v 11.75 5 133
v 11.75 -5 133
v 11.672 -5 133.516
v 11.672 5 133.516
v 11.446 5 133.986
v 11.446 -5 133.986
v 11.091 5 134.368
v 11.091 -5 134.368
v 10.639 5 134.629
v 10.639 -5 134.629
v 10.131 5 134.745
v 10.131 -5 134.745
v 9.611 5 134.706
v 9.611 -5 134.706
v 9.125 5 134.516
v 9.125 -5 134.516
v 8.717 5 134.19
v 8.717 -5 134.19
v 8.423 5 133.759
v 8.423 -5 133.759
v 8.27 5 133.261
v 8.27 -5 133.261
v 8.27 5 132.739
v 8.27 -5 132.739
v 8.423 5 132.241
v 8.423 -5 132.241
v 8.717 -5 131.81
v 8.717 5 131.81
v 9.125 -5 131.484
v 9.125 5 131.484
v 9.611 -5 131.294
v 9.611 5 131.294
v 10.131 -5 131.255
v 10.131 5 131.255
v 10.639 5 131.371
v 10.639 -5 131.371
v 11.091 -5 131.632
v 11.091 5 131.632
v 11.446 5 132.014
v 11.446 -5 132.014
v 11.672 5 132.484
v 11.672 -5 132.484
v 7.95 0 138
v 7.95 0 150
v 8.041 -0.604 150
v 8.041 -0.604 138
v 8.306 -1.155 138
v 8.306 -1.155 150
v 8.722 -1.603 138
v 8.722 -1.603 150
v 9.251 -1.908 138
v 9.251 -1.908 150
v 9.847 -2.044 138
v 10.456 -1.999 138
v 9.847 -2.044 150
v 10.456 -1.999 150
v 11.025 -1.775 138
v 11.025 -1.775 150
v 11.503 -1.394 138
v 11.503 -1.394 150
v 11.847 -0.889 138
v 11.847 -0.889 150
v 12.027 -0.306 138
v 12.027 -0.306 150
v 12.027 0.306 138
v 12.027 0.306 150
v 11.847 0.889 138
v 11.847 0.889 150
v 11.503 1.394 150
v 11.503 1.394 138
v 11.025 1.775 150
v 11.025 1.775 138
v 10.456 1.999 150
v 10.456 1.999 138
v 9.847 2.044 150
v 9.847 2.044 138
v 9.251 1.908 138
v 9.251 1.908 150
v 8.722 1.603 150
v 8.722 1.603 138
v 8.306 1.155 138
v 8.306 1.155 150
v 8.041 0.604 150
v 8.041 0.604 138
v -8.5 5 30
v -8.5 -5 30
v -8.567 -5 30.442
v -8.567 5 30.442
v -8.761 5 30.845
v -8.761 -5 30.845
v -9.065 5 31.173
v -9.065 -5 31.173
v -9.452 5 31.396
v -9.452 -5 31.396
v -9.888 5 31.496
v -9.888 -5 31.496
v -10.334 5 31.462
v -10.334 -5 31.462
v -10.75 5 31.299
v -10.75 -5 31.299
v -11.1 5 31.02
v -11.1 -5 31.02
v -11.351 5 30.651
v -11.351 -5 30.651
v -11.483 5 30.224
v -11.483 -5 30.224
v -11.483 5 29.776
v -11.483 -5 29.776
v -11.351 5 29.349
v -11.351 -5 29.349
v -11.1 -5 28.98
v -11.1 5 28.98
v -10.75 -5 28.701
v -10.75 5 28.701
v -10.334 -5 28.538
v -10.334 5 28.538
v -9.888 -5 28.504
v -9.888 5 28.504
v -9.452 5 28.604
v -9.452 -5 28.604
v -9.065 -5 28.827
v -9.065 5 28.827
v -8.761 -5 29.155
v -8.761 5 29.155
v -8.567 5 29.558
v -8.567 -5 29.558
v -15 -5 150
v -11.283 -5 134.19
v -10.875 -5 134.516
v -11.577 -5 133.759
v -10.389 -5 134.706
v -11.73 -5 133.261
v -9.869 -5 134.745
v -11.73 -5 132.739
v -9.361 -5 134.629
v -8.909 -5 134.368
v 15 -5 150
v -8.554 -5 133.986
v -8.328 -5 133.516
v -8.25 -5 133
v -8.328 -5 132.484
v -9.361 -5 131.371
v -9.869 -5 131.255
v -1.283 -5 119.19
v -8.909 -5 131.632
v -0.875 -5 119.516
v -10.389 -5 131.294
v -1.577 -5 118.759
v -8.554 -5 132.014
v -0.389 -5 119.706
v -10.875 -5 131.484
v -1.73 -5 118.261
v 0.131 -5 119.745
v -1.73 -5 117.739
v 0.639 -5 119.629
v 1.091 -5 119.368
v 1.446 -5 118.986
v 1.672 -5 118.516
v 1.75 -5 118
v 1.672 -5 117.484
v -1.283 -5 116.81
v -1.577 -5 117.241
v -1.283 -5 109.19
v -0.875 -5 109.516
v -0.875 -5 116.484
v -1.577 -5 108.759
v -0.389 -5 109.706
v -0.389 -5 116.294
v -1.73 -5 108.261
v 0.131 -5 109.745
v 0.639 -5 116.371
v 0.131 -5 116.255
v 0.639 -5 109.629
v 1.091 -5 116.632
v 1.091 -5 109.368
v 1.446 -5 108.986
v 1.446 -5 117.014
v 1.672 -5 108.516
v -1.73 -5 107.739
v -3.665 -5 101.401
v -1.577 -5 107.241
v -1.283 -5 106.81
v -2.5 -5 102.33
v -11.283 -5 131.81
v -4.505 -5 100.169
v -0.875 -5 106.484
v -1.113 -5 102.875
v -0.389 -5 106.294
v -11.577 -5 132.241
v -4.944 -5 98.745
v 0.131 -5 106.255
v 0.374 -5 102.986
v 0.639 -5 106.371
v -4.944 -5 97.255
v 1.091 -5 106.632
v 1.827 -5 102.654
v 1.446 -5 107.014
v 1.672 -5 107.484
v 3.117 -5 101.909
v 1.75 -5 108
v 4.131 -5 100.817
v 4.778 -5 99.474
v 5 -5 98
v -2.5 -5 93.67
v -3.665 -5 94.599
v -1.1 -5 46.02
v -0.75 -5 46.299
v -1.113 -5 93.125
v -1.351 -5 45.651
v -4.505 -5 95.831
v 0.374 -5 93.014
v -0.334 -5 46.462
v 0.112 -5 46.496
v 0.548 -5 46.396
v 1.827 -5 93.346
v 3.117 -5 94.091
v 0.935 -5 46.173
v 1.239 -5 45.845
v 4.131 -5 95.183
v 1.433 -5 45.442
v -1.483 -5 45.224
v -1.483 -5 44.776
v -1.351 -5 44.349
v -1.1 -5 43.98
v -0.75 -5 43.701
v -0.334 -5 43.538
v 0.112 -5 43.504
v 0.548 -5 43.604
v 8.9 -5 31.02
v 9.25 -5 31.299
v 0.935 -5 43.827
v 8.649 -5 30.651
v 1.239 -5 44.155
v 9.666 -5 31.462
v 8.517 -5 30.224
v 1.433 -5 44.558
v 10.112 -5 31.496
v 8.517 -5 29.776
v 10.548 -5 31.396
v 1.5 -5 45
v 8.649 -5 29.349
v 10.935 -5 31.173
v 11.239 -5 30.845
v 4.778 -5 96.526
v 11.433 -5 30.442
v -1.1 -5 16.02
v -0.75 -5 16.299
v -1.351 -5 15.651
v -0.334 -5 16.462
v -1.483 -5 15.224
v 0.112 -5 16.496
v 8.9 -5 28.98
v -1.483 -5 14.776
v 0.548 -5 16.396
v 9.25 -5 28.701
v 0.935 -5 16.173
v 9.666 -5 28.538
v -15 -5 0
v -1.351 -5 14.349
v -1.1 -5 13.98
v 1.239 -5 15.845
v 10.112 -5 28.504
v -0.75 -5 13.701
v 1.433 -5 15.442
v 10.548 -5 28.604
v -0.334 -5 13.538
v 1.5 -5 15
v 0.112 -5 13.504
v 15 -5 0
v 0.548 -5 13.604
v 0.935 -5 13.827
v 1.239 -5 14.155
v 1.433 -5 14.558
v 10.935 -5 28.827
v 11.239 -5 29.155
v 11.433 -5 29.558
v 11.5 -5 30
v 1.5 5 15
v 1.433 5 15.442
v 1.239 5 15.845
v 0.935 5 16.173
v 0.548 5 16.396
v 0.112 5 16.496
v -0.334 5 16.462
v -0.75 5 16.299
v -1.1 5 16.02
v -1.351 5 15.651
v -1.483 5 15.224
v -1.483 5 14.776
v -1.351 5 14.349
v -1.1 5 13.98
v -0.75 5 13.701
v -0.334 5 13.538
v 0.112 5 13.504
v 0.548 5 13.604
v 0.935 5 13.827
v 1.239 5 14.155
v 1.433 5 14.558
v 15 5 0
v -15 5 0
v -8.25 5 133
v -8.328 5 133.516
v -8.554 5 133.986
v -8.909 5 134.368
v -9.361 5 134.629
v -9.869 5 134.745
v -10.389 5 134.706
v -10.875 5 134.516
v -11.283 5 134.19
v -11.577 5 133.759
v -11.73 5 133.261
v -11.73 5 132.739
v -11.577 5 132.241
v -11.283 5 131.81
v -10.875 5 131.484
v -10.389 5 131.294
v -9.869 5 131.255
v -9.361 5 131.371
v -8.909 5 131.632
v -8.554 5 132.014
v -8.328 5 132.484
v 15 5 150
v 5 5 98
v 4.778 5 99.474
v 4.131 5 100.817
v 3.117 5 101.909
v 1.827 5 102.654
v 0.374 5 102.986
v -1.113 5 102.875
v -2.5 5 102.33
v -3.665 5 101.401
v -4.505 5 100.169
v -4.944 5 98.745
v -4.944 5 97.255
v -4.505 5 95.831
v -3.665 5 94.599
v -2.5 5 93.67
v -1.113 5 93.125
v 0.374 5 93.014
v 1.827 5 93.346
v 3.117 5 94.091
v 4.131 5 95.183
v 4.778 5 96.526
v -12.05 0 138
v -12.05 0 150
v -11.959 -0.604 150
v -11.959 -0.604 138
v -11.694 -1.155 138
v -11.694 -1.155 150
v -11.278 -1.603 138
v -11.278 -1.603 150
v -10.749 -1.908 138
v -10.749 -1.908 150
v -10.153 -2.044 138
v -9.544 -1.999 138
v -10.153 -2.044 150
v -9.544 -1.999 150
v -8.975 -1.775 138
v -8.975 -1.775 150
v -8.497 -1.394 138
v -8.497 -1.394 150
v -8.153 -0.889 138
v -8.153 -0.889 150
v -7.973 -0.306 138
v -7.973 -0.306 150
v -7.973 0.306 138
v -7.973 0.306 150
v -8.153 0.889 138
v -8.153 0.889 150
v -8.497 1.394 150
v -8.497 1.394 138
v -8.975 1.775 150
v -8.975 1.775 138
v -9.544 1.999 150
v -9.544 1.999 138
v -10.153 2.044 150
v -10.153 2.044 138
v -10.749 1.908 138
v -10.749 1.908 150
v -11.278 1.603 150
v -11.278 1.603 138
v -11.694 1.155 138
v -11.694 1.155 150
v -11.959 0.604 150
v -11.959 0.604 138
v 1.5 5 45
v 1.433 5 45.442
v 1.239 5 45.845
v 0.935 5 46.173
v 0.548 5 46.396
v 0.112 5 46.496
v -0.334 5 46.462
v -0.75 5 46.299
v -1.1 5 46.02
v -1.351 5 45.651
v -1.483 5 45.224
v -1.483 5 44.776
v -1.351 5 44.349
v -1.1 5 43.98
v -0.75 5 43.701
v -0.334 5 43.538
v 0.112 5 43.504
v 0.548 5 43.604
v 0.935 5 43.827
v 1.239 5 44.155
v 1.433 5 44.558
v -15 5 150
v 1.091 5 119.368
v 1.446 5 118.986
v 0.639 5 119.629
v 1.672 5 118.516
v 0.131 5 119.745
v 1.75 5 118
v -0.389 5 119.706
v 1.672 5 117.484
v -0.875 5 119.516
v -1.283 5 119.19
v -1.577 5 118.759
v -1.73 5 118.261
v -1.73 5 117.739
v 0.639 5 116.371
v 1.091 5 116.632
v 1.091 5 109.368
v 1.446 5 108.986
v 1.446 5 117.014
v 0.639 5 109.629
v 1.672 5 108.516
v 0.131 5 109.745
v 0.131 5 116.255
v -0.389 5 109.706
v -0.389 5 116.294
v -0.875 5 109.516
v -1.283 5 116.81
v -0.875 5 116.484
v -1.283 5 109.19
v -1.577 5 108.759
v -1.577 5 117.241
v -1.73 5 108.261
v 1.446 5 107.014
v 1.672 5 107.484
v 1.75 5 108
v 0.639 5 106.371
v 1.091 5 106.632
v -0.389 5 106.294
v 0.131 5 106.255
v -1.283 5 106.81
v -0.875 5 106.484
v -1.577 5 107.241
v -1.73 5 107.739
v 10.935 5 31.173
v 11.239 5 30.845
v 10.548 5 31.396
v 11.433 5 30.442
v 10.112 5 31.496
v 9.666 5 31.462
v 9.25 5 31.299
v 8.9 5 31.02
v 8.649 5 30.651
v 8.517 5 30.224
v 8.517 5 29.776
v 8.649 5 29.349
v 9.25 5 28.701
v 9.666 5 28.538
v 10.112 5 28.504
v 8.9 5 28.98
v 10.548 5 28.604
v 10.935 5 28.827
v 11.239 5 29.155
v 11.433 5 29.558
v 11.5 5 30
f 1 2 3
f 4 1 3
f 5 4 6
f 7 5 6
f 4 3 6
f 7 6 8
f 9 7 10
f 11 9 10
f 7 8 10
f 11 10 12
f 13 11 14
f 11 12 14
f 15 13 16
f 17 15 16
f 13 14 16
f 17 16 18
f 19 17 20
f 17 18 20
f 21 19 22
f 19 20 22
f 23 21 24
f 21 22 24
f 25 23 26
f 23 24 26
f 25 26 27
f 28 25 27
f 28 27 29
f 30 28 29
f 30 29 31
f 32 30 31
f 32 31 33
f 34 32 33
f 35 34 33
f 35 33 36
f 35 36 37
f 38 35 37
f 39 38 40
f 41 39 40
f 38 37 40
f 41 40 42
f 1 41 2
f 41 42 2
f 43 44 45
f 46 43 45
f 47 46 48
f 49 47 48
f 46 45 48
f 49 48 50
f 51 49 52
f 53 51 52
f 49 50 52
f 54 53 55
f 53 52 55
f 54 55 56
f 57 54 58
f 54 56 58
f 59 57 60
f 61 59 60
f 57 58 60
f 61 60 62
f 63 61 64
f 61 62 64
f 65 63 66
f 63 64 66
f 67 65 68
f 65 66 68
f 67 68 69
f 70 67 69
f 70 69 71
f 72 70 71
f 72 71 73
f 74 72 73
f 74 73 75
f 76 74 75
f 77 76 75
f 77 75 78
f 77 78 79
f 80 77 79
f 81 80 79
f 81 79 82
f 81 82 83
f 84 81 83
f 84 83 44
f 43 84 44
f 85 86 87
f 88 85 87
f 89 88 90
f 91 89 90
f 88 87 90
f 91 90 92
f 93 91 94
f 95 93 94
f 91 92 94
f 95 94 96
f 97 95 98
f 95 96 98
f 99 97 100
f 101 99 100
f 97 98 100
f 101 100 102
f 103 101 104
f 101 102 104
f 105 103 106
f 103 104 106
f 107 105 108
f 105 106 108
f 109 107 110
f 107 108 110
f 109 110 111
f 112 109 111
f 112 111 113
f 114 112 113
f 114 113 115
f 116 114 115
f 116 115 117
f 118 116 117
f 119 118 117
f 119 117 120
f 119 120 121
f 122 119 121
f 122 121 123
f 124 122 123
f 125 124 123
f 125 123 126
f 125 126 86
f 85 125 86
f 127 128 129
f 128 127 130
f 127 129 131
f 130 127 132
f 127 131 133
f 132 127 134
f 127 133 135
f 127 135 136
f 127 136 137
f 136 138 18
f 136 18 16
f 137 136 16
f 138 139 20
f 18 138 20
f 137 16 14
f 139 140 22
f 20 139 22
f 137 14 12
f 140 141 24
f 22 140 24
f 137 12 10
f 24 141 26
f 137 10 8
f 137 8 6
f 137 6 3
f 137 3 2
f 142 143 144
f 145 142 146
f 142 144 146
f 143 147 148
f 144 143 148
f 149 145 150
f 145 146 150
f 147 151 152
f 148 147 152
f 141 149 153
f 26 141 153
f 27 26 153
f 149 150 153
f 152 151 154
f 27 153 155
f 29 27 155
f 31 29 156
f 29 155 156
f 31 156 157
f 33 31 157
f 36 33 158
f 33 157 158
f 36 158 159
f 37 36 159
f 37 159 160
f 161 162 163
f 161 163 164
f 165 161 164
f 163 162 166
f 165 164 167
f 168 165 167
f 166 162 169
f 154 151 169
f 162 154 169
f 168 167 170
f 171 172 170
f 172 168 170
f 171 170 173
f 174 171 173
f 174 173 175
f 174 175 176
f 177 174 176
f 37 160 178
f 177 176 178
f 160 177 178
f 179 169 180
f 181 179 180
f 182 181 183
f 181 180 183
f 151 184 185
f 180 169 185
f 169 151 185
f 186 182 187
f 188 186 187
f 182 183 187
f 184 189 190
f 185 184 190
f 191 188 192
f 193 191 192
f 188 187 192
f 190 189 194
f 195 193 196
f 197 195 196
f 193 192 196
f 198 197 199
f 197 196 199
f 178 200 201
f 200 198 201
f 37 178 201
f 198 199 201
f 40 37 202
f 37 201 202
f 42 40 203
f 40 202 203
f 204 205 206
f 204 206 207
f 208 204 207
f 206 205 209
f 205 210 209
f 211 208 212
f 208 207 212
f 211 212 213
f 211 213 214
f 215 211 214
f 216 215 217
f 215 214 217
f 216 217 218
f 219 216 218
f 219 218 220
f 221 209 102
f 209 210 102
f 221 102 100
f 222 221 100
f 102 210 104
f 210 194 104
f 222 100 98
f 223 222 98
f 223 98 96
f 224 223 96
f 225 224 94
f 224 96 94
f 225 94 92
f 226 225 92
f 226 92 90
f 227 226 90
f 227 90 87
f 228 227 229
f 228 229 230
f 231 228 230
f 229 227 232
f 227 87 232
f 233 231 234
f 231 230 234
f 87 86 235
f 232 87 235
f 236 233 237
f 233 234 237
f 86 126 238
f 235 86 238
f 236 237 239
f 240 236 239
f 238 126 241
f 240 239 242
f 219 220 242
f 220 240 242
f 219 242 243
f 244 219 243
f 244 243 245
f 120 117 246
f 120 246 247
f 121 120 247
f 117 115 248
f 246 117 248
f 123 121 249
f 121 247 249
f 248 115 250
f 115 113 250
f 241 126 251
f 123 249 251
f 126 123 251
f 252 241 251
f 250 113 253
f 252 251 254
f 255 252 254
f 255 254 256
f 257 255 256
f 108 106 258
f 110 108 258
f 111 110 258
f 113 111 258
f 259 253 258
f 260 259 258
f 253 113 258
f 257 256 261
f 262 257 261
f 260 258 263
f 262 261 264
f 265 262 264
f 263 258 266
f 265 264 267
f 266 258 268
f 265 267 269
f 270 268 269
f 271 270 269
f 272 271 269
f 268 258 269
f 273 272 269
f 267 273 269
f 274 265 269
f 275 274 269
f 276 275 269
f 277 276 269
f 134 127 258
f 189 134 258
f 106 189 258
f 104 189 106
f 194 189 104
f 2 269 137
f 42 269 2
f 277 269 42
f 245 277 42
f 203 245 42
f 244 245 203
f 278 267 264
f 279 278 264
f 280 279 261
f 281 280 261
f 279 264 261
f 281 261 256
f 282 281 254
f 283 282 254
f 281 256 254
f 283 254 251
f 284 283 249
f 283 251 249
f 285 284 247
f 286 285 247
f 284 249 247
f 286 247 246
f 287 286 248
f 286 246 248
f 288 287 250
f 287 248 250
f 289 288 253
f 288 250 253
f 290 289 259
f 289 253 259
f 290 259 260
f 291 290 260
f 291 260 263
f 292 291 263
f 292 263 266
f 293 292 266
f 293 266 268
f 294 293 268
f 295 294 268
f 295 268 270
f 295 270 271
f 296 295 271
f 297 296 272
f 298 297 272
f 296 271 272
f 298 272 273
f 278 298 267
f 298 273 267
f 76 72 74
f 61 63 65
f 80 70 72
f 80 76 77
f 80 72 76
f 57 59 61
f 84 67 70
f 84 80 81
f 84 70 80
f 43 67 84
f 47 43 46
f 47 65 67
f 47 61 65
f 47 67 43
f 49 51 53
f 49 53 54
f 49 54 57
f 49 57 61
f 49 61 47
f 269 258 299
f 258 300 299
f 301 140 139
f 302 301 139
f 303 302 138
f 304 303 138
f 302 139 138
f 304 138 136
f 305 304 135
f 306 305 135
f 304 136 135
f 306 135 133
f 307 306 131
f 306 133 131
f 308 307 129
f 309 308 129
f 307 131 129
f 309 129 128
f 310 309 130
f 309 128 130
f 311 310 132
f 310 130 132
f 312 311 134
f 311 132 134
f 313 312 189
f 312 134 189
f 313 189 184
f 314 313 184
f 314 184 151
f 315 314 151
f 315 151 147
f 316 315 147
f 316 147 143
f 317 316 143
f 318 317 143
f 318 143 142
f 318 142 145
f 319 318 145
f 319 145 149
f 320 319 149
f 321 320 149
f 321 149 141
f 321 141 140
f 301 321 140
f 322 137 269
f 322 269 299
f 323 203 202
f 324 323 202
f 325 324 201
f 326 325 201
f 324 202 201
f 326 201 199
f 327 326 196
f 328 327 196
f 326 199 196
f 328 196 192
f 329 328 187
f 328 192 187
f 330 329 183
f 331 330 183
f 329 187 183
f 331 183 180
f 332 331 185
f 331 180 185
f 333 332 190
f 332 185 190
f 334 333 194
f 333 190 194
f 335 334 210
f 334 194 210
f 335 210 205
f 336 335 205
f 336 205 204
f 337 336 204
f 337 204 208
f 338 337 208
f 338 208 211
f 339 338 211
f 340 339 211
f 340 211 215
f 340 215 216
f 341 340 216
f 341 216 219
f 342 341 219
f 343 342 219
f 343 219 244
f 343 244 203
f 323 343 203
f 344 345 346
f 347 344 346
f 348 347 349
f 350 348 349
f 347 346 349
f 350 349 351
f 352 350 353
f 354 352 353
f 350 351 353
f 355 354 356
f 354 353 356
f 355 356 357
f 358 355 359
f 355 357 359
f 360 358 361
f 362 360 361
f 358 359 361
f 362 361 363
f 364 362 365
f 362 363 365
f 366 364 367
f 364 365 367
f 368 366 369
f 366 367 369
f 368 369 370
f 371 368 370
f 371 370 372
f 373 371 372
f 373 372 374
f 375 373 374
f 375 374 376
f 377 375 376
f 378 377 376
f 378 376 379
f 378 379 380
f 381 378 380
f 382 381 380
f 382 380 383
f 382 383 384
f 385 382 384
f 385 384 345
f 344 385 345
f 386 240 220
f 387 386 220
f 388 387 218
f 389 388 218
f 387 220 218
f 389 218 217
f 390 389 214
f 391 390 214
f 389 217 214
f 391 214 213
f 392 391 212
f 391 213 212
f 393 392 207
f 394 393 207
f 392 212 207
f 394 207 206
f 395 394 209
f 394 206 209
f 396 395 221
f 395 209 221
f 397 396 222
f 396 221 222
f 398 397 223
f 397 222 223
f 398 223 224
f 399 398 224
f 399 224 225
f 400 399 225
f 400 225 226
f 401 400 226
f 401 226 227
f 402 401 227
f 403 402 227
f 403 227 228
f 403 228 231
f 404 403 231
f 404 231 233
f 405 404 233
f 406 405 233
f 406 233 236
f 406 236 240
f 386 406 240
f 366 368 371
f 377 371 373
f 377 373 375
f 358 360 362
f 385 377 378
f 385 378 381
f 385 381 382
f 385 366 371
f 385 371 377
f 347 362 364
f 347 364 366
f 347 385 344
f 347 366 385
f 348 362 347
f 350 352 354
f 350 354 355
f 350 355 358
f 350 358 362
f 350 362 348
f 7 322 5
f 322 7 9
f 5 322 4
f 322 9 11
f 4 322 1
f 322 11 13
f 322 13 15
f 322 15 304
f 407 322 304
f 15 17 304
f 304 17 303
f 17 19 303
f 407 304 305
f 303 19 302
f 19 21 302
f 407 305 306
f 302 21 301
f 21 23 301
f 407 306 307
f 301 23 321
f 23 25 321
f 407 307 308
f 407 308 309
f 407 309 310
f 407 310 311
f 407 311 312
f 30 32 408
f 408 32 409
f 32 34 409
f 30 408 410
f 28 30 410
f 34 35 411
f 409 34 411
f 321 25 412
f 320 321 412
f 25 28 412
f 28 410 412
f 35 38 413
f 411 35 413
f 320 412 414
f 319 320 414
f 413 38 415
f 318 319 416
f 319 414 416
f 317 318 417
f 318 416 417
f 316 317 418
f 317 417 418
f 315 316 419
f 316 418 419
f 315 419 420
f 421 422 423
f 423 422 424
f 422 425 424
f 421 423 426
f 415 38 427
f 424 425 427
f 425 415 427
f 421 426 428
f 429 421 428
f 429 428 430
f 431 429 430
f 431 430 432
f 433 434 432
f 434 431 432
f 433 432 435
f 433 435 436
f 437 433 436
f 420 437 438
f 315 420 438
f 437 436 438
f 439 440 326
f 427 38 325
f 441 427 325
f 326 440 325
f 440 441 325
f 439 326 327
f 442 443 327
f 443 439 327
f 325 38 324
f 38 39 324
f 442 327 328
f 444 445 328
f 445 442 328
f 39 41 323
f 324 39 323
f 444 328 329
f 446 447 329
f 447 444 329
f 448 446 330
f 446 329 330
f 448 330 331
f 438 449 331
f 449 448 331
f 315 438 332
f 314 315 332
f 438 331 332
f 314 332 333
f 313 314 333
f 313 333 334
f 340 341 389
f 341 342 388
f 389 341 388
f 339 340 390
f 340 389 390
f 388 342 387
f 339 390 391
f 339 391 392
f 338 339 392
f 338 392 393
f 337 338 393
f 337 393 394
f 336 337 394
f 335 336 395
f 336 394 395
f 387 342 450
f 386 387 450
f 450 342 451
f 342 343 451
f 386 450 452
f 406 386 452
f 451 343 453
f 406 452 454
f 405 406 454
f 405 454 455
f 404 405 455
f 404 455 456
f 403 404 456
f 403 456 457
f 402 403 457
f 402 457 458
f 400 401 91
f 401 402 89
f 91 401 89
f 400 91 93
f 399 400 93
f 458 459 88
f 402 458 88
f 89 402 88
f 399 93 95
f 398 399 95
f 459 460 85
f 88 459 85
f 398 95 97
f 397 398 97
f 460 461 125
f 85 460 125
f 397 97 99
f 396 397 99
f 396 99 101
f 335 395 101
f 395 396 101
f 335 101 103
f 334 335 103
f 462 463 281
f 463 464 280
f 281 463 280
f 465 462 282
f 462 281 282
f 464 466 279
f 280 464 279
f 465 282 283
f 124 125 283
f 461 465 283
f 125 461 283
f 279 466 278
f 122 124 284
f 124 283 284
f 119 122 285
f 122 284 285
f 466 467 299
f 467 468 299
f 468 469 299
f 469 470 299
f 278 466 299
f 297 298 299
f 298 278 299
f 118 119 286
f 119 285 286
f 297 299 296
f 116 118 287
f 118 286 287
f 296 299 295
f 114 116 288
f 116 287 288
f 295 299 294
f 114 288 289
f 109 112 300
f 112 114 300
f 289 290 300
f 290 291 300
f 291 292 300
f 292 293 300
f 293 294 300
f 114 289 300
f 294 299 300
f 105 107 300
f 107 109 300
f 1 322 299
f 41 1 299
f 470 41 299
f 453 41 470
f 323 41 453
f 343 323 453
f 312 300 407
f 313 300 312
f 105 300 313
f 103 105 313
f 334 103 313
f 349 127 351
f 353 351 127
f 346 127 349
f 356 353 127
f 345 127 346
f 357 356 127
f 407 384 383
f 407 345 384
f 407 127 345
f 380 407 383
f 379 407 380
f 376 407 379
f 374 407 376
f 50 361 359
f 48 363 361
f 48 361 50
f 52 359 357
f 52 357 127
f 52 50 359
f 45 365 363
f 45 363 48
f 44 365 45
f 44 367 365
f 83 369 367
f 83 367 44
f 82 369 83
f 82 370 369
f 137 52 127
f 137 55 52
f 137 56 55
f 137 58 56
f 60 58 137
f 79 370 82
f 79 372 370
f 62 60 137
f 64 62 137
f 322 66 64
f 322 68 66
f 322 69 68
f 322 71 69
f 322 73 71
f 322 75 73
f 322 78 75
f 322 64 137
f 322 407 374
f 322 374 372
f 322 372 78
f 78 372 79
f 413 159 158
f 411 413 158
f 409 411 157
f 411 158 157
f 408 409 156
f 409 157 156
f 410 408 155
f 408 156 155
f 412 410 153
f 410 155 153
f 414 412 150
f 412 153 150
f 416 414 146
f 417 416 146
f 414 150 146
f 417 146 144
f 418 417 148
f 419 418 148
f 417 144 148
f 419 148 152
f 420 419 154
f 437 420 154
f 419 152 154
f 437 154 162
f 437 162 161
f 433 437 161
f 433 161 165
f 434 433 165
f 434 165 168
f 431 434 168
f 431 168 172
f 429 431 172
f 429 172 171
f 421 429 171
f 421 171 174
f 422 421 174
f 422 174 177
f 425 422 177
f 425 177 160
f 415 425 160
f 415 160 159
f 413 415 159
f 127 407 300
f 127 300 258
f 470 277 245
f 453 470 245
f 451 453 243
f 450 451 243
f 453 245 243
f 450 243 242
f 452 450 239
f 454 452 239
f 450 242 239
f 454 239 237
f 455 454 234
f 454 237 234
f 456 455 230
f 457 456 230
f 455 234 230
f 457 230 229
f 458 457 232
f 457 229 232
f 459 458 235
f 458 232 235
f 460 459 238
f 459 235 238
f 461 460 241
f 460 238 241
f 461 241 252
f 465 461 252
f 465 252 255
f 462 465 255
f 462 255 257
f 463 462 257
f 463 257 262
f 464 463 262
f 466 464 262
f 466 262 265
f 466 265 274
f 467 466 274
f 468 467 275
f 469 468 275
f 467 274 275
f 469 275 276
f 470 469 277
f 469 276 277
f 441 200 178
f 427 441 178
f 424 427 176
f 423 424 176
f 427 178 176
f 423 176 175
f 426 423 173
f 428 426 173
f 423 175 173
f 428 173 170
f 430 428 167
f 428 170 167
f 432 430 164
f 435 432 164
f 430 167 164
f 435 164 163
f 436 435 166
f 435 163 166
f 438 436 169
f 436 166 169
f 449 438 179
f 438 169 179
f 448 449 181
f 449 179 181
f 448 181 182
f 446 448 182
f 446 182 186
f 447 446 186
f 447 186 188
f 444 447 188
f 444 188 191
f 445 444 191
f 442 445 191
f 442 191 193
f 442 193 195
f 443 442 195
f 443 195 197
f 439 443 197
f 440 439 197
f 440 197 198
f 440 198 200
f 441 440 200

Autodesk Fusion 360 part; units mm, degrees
sketch "Sketch1" plane through (0, 0, 0) normal (0, 0, 1) x (1, 0, 0)
  line L0 (15, 5) -> (-15, 5)
  line L1 (-15, 5) -> (-15, -5)
  line L2 (-15, -5) -> (15, -5)
  line L3 (15, -5) -> (15, 5)
  line L4 (15, 5) -> (-15, -5) construction
  line L5 (-15, 5) -> (15, -5) construction
  dimension "d1" = 30
  dimension "d2" = 10
extrude "Extrude1" add sketch "Sketch1" along normal blind 150
sketch "Sketch2" plane through (0, -5, 0) normal (0, -1, 0) x (1, 0, 0)
  line L0 (-15, 0) -> (15, 0)
  line L1 (15, 0) -> (15, 150)
  line L2 (15, 150) -> (-15, 150)
  line L3 (-15, 150) -> (-15, 0)
  circle A0 centre (0, 118) radius 1.75
  line L4 (0, 150) -> (0, 118)
  circle A1 centre (-10, 133) radius 1.75
  circle A2 centre (10, 133) radius 1.75
  dimension "d5" = 3.5
  dimension "d6" = 32
  dimension "d7" = 3.5
  dimension "d8" = 3.5
  dimension "d9" = 10
  dimension "d10" = 10
  dimension "d11" = 15
  dimension "d12" = 15
extrude "Extrude2" cut sketch "Sketch2" against normal blind 10 contours A0 | A1 | A2
sketch "Sketch3" plane through (0, 0, 150) normal (0, 0, 1) x (-1, 0, 0)
  line L0 (-15, 5) -> (-15, -5)
  line L1 (-15, -5) -> (15, -5)
  line L2 (15, -5) -> (15, 5)
  line L3 (15, 5) -> (-15, 5)
  circle A0 centre (10, 0) radius 2.05
  circle A1 centre (-10, 0) radius 2.05
  dimension "d15" = 4.1
  dimension "d17" = 10
  dimension "d18" = 10
extrude "Extrude3" cut sketch "Sketch3" against normal blind 12 contours A0 | A1
sketch "Sketch4" plane through (0, -5, 0) normal (0, -1, 0) x (1, 0, 0)
  circle A0 centre (-10, 133) radius 1.75
  circle A1 centre (10, 133) radius 1.75
  circle A2 centre (0, 118) radius 1.75
  line L0 (-15, 0) -> (15, 0)
  line L1 (15, 0) -> (15, 150)
  line L2 (15, 150) -> (-15, 150)
  line L3 (-15, 150) -> (-15, 0)
  line L4 (0, 0) -> (0, 6)
  circle A3 centre (0, 15) radius 1.5
  circle A4 centre (-10, 30) radius 1.5
  circle A5 centre (10, 30) radius 1.5
  circle A6 centre (0, 45) radius 1.5
  dimension "d21" = 3
  dimension "d22" = 15
  dimension "d23" = 3
  dimension "d24" = 10
  dimension "d25" = 30
  dimension "d26" = 3
  dimension "d27" = 45
extrude "Extrude4" cut sketch "Sketch4" against normal blind 10 contours A3 | A4 | A5 | A6
sketch "Sketch5" plane through (0, -5, 0) normal (0, -1, 0) x (1, 0, 0)
  circle A0 centre (0, 45) radius 1.5
  circle A1 centre (10, 30) radius 1.5
  circle A2 centre (-10, 30) radius 1.5
  circle A3 centre (0, 15) radius 1.5
  circle A4 centre (-10, 133) radius 1.75
  circle A5 centre (10, 133) radius 1.75
  circle A6 centre (0, 118) radius 1.75
  line L0 (-15, 0) -> (15, 0)
  line L1 (15, 0) -> (15, 150)
  line L2 (15, 150) -> (-15, 150)
  line L3 (-15, 150) -> (-15, 0)
  circle A7 centre (0, 108) radius 1.75
  dimension "d30" = 3.5
  dimension "d31" = 10
extrude "Extrude5" cut sketch "Sketch5" against normal blind 10 contours A7
sketch "Sketch6" plane through (0, -5, 0) normal (0, -1, 0) x (1, 0, 0)
  circle A0 centre (0, 108) radius 1.75
  circle A1 centre (0, 45) radius 1.5
  circle A2 centre (10, 30) radius 1.5
  circle A3 centre (-10, 30) radius 1.5
  circle A4 centre (0, 15) radius 1.5
  circle A5 centre (-10, 133) radius 1.75
  circle A6 centre (10, 133) radius 1.75
  circle A7 centre (0, 118) radius 1.75
  line L0 (-15, 0) -> (15, 0)
  line L1 (15, 0) -> (15, 150)
  line L2 (15, 150) -> (-15, 150)
  line L3 (-15, 150) -> (-15, 0)
  circle A8 centre (0, 98) radius 5
  dimension "d34" = 10
  dimension "d35" = 10
extrude "Extrude6" cut sketch "Sketch6" against normal blind 10 contours A8
